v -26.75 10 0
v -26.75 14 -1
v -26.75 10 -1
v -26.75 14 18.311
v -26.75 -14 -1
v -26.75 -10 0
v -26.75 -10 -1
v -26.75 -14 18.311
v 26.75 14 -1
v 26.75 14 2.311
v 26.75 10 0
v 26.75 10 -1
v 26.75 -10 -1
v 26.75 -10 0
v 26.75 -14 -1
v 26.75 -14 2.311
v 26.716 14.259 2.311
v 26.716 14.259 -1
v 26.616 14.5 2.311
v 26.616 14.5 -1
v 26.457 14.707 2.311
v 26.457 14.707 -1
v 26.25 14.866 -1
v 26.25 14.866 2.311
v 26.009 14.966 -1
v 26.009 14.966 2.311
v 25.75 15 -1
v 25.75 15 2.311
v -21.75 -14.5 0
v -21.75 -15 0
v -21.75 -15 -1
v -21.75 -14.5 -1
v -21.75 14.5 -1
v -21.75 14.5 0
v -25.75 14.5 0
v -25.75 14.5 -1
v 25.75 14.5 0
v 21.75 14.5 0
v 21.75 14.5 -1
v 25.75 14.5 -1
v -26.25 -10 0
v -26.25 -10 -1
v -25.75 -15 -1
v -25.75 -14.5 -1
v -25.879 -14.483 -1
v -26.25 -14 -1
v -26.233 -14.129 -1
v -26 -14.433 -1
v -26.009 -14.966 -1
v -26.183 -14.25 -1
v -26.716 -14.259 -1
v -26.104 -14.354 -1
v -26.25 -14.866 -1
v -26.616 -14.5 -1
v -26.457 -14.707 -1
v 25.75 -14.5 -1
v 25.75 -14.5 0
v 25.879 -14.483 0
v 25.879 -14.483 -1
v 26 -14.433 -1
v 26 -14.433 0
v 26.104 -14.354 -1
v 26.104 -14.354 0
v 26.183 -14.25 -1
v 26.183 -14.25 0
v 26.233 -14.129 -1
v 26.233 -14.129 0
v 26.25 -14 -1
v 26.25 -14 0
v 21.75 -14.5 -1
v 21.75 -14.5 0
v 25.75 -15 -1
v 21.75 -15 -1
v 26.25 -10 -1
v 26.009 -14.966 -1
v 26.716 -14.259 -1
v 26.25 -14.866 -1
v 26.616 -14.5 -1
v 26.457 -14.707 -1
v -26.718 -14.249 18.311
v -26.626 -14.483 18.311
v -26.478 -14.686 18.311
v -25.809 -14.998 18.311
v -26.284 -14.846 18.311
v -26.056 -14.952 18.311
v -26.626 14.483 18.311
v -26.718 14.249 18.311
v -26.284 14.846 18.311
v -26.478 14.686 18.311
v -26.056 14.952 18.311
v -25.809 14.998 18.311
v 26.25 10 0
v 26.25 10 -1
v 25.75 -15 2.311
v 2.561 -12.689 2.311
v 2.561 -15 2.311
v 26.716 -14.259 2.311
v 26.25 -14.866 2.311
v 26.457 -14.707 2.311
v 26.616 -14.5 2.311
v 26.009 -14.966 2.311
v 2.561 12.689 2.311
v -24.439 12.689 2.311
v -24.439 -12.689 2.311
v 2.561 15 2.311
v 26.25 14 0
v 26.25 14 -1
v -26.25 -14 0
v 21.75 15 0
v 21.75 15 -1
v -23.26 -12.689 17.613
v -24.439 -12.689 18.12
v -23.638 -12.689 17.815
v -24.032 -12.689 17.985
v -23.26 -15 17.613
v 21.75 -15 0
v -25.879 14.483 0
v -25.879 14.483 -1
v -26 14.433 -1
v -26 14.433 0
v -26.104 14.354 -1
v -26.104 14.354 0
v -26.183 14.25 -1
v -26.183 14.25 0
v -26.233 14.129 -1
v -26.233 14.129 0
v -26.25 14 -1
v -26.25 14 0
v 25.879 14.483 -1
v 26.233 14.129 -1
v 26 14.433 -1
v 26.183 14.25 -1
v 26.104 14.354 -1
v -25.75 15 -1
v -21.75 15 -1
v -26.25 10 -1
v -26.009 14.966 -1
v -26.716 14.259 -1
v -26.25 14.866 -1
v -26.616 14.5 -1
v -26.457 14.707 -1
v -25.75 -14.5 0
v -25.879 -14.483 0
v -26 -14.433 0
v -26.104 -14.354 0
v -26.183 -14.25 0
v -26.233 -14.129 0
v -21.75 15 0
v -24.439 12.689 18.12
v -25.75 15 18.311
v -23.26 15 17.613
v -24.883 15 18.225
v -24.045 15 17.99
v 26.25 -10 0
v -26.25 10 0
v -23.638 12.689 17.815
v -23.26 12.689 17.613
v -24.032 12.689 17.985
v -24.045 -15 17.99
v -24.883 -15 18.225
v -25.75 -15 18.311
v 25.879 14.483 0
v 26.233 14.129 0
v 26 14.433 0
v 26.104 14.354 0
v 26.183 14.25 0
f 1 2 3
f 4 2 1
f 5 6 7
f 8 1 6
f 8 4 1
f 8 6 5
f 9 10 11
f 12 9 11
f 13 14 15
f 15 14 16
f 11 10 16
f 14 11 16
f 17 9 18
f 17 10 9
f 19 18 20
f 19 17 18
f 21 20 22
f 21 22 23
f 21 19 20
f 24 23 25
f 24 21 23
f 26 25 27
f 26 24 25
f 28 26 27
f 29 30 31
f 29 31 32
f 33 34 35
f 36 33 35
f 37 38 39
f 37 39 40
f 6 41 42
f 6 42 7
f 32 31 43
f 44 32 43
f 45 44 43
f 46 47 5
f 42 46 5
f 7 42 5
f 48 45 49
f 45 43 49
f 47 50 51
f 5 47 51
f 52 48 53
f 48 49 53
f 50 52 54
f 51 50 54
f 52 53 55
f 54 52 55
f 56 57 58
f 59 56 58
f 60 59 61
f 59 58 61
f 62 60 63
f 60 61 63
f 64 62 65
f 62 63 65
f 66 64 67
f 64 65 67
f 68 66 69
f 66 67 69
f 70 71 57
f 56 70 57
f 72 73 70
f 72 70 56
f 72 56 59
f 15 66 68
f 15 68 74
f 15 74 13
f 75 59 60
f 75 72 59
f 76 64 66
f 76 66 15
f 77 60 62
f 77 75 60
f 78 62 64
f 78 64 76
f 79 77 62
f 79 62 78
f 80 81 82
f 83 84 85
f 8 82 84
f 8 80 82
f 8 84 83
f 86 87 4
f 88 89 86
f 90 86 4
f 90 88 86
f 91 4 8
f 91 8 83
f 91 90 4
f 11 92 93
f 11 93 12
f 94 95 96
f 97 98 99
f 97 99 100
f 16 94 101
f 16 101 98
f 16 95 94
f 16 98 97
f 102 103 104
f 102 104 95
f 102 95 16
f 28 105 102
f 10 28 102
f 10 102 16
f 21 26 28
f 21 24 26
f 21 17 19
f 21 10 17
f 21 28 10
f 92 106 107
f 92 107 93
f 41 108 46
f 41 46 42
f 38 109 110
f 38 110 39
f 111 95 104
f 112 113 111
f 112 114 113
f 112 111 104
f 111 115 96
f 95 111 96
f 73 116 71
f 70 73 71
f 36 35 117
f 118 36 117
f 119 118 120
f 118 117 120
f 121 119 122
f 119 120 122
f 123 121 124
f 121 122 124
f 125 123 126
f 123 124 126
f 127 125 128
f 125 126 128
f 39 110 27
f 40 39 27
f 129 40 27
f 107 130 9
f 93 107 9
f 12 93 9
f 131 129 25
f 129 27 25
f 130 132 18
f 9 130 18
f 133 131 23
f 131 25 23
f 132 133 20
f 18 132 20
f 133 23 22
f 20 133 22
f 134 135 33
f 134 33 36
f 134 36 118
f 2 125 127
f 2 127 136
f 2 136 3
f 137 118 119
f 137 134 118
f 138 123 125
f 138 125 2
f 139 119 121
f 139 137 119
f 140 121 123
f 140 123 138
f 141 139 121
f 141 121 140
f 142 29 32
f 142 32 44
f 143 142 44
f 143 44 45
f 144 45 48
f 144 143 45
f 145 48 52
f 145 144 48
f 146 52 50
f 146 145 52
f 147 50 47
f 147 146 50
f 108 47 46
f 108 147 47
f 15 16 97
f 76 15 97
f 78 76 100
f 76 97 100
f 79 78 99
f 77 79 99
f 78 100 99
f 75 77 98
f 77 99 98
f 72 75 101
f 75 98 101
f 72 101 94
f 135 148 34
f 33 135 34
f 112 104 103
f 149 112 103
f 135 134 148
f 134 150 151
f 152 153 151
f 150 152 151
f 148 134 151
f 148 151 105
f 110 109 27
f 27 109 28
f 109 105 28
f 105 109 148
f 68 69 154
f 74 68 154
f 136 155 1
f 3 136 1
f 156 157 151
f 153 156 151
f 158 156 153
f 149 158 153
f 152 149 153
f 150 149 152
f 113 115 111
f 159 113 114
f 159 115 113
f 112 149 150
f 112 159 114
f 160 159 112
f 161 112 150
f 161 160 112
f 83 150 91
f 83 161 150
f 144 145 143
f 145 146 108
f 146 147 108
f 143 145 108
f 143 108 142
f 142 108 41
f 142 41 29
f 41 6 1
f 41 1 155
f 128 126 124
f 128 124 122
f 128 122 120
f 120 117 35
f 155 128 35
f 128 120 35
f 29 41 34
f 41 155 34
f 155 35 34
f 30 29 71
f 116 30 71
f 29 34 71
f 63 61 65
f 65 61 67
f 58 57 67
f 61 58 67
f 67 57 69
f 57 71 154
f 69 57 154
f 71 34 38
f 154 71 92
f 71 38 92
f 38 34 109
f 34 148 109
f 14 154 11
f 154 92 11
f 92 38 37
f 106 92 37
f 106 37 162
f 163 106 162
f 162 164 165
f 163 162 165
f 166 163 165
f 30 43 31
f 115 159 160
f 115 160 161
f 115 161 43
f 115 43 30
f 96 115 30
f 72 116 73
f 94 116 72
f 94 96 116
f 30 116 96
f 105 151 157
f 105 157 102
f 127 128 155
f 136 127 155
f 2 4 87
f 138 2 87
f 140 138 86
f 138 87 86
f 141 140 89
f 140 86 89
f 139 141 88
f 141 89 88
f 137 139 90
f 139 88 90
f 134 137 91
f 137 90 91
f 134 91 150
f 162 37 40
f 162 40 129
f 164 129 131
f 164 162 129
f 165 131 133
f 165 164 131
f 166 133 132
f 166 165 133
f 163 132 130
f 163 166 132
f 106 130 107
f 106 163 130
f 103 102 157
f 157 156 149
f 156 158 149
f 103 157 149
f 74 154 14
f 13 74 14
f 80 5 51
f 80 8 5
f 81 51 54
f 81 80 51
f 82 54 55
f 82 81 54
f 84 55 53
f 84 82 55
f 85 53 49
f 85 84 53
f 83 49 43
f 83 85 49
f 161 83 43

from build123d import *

# Parameters (mm, degrees)
SKETCH1_W            = 53.5
SKETCH1_H            = 30
BOSS_EXTRUDE1_DEPTH  = 2.3114
SKETCH2_W            = 2.3114
SKETCH2_H            = 30
BOSS_EXTRUDE2_DEPTH  = 16
BOSS_EXTRUDE3_DEPTH  = 2.3114
FILLET1_R            = 1
FILLET2_START        = -16
FILLET2_DEPTH        = 32
BOSS_EXTRUDE5_DEPTH  = 1
MIRROR3_COPY_1_DEPTH = 1


with BuildPart() as part:
    # Sketch1 → Boss-Extrude1 (new body)
    with BuildSketch(Plane.XY):
        Rectangle(SKETCH1_W, SKETCH1_H)
    extrude(amount=BOSS_EXTRUDE1_DEPTH)

    # Sketch2 → Boss-Extrude2 (add)
    with BuildSketch(Plane.XY.offset(2.3114)):
        with Locations((-25.5943, 0)):
            Rectangle(SKETCH2_W, SKETCH2_H)
    extrude(amount=BOSS_EXTRUDE2_DEPTH)

    # Sketch3 → Boss-Extrude3 (add)
    with BuildSketch(Plane.XZ.offset(15)):
        Polygon((-24.4386, 18.3114), (2.5614, 2.3114), (-24.4386, 2.3114), align=None)
    boss_extrude3 = extrude(amount=-BOSS_EXTRUDE3_DEPTH)

    # Mirror1: Boss-Extrude3 across plane
    add(boss_extrude3.mirror(Plane.ZX))

    # Fillet1
    fillet1_edges = [part.edges().sort_by_distance(p)[0] for p in [
        (26.75, 15, 1.1557),
        (26.75, -15, 1.1557),
        (-26.75, 15, 9.1557),
        (-26.75, -15, 9.1557),
    ]]
    fillet(fillet1_edges, radius=FILLET1_R)

    # Fillet2: read off the stored shape, not the designer's step
    # Fillet2 outline → Fillet2 (cut)
    with BuildSketch(Plane(origin=(0, 0, 0), x_dir=(1, 0, 0), z_dir=(0, 1, 0)).offset(FILLET2_START)):
        with BuildLine():
            Line((-24.4386, -18.3114), (-23.259809815, -17.612857668))
            ThreePointArc((-23.259809815, -17.612857668), (-24.487324196, -18.133603249), (-25.808821767, -18.3114))
            Line((-25.808821767, -18.3114), (-24.4386, -18.3114))
        make_face()
    extrude(amount=FILLET2_DEPTH, mode=Mode.SUBTRACT)

    # Sketch7 → Boss-Extrude5 (add)
    with BuildSketch(Plane(origin=(0, 0, 0), x_dir=(-1, 0, 0), z_dir=(0, 0, -1))):
        with BuildLine():
            Line((-25.75, 15), (-21.75, 15))
            Line((-21.75, 15), (-21.75, 14.5))
            Line((-21.75, 14.5), (-25.75, 14.5))
            ThreePointArc((-25.75, 14.5), (-26.103553391, 14.353553391), (-26.25, 14))
            Line((-26.25, 14), (-26.25, 10))
            Line((-26.25, 10), (-26.75, 10))
            Line((-26.75, 10), (-26.75, 14))
            ThreePointArc((-26.75, 14), (-26.457106781, 14.707106781), (-25.75, 15))
        make_face()
    boss_extrude5 = extrude(amount=BOSS_EXTRUDE5_DEPTH)

    # Mirror2: Boss-Extrude5 across plane
    add(boss_extrude5.mirror(Plane.ZX))

    # Mirror3: Boss-Extrude5 across plane
    add(boss_extrude5.mirror(Plane(origin=(0, 0, 0), x_dir=(0, 0, 1), z_dir=(1, 0, 0))))

    # Mirror3 copy 1 sketch → Mirror3 copy 1 (add)
    with BuildSketch(Plane(origin=(0, 0, 0), x_dir=(1, 0, 0), z_dir=(0, 0, -1))):
        with BuildLine():
            Line((-25.75, 15), (-21.75, 15))
            Line((-21.75, 15), (-21.75, 14.5))
            Line((-21.75, 14.5), (-25.75, 14.5))
            ThreePointArc((-25.75, 14.5), (-26.103553391, 14.353553391), (-26.25, 14))
            Line((-26.25, 14), (-26.25, 10))
            Line((-26.25, 10), (-26.75, 10))
            Line((-26.75, 10), (-26.75, 14))
            ThreePointArc((-26.75, 14), (-26.457106781, 14.707106781), (-25.75, 15))
        make_face()
    extrude(amount=MIRROR3_COPY_1_DEPTH)


solid = part.part
